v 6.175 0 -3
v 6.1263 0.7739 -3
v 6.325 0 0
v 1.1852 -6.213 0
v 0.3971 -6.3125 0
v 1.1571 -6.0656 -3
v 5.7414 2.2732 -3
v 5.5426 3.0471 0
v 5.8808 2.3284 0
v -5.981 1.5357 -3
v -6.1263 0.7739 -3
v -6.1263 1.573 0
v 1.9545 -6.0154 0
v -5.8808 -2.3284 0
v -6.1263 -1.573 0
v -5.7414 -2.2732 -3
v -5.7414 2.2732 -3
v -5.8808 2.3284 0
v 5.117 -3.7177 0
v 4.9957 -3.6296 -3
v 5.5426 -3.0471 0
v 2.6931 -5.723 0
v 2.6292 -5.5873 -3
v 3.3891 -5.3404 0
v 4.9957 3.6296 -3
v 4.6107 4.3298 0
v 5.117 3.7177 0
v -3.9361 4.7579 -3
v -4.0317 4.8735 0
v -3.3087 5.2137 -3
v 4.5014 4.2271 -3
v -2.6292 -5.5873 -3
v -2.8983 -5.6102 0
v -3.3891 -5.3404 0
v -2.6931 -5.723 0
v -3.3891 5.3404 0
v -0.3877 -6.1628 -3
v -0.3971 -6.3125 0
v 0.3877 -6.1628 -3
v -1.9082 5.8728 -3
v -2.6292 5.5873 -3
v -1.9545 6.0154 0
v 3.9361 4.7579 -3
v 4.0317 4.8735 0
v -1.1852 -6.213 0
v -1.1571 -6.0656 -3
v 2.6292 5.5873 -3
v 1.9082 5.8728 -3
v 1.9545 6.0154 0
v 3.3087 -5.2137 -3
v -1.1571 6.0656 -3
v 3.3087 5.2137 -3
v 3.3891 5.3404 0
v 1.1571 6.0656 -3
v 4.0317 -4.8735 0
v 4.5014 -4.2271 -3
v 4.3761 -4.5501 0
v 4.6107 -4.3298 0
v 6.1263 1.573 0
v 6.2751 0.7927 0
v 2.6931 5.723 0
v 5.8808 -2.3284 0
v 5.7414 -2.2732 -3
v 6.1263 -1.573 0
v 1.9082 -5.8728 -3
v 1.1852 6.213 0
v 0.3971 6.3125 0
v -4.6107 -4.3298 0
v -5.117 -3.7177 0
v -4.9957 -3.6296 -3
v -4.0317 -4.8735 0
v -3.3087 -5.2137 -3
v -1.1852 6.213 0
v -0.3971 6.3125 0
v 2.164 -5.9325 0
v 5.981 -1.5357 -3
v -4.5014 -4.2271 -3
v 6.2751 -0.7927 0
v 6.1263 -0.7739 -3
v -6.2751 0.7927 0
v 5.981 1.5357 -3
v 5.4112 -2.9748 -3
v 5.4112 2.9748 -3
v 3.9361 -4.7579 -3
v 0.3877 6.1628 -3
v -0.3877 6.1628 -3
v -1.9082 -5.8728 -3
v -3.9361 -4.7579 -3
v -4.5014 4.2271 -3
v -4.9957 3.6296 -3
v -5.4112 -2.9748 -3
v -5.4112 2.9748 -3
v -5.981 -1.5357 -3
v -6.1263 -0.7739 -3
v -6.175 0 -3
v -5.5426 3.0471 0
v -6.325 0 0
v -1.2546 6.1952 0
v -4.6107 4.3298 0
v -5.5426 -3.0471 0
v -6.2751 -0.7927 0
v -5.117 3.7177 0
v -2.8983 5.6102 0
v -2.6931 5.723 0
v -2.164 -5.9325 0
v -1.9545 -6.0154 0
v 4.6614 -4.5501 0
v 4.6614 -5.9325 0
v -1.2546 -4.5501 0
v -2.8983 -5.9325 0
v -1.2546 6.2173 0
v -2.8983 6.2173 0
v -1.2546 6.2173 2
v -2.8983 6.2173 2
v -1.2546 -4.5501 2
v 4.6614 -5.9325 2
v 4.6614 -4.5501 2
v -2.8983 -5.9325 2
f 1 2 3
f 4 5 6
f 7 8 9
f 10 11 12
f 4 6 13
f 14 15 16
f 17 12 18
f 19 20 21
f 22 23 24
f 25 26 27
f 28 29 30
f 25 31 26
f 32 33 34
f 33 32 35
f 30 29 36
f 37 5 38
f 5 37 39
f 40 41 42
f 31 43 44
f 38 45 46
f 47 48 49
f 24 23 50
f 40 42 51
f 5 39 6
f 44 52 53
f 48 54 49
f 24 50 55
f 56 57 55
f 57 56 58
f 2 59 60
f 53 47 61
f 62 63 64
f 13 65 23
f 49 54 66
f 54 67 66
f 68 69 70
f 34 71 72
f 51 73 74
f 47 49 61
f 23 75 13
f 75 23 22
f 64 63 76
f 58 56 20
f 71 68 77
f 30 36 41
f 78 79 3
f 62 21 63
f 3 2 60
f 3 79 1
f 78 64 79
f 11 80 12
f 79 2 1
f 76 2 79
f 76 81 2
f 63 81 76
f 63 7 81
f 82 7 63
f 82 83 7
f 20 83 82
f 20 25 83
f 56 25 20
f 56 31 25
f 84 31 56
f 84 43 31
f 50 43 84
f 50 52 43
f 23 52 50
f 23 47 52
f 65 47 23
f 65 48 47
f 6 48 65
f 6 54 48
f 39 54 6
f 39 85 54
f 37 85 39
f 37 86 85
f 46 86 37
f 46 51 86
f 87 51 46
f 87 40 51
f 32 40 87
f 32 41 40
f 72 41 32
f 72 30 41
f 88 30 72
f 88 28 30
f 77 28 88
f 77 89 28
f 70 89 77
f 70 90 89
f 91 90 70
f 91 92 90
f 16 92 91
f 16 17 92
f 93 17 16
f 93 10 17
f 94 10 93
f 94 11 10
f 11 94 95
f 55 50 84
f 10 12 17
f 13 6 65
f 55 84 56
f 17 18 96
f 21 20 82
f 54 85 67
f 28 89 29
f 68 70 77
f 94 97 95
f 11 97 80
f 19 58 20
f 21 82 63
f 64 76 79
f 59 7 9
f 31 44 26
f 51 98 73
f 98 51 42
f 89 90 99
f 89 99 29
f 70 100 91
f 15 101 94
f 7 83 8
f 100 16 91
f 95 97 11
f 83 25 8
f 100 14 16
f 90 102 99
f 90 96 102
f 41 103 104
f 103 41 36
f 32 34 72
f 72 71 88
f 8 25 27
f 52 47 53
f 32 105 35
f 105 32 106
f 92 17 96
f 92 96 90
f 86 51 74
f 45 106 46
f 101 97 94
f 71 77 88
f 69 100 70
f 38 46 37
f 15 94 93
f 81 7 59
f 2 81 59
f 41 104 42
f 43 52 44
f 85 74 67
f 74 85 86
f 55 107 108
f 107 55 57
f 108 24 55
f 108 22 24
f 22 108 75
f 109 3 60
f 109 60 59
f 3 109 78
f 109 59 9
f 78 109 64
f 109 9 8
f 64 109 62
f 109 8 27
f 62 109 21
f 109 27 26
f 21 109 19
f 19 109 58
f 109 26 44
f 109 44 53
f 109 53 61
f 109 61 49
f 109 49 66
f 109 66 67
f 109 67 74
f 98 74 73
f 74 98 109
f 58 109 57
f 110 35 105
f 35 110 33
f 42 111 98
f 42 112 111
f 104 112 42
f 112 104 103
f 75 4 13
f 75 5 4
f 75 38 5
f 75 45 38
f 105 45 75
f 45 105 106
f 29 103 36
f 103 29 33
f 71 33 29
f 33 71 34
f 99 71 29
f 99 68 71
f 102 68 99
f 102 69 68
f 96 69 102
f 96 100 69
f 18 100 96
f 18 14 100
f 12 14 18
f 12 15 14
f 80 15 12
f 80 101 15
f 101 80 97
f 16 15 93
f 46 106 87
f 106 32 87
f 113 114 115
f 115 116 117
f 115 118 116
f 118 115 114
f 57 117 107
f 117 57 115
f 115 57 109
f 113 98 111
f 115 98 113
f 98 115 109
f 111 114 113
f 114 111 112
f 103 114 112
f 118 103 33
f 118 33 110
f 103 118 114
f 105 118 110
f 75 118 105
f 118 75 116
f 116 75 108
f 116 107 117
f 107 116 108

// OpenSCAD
$fn = 50;


difference() {
	union() {
		translate(v = [0, 0, -3.0000000000]) {
			cylinder(h = 3, r1 = 6.1750000000, r2 = 6.3250000000);
		}
		linear_extrude(height = 2) {
			text(font = "Impact", halign = "center", size = 12, text = "L", valign = "center");
		}
	}
	union();
}
